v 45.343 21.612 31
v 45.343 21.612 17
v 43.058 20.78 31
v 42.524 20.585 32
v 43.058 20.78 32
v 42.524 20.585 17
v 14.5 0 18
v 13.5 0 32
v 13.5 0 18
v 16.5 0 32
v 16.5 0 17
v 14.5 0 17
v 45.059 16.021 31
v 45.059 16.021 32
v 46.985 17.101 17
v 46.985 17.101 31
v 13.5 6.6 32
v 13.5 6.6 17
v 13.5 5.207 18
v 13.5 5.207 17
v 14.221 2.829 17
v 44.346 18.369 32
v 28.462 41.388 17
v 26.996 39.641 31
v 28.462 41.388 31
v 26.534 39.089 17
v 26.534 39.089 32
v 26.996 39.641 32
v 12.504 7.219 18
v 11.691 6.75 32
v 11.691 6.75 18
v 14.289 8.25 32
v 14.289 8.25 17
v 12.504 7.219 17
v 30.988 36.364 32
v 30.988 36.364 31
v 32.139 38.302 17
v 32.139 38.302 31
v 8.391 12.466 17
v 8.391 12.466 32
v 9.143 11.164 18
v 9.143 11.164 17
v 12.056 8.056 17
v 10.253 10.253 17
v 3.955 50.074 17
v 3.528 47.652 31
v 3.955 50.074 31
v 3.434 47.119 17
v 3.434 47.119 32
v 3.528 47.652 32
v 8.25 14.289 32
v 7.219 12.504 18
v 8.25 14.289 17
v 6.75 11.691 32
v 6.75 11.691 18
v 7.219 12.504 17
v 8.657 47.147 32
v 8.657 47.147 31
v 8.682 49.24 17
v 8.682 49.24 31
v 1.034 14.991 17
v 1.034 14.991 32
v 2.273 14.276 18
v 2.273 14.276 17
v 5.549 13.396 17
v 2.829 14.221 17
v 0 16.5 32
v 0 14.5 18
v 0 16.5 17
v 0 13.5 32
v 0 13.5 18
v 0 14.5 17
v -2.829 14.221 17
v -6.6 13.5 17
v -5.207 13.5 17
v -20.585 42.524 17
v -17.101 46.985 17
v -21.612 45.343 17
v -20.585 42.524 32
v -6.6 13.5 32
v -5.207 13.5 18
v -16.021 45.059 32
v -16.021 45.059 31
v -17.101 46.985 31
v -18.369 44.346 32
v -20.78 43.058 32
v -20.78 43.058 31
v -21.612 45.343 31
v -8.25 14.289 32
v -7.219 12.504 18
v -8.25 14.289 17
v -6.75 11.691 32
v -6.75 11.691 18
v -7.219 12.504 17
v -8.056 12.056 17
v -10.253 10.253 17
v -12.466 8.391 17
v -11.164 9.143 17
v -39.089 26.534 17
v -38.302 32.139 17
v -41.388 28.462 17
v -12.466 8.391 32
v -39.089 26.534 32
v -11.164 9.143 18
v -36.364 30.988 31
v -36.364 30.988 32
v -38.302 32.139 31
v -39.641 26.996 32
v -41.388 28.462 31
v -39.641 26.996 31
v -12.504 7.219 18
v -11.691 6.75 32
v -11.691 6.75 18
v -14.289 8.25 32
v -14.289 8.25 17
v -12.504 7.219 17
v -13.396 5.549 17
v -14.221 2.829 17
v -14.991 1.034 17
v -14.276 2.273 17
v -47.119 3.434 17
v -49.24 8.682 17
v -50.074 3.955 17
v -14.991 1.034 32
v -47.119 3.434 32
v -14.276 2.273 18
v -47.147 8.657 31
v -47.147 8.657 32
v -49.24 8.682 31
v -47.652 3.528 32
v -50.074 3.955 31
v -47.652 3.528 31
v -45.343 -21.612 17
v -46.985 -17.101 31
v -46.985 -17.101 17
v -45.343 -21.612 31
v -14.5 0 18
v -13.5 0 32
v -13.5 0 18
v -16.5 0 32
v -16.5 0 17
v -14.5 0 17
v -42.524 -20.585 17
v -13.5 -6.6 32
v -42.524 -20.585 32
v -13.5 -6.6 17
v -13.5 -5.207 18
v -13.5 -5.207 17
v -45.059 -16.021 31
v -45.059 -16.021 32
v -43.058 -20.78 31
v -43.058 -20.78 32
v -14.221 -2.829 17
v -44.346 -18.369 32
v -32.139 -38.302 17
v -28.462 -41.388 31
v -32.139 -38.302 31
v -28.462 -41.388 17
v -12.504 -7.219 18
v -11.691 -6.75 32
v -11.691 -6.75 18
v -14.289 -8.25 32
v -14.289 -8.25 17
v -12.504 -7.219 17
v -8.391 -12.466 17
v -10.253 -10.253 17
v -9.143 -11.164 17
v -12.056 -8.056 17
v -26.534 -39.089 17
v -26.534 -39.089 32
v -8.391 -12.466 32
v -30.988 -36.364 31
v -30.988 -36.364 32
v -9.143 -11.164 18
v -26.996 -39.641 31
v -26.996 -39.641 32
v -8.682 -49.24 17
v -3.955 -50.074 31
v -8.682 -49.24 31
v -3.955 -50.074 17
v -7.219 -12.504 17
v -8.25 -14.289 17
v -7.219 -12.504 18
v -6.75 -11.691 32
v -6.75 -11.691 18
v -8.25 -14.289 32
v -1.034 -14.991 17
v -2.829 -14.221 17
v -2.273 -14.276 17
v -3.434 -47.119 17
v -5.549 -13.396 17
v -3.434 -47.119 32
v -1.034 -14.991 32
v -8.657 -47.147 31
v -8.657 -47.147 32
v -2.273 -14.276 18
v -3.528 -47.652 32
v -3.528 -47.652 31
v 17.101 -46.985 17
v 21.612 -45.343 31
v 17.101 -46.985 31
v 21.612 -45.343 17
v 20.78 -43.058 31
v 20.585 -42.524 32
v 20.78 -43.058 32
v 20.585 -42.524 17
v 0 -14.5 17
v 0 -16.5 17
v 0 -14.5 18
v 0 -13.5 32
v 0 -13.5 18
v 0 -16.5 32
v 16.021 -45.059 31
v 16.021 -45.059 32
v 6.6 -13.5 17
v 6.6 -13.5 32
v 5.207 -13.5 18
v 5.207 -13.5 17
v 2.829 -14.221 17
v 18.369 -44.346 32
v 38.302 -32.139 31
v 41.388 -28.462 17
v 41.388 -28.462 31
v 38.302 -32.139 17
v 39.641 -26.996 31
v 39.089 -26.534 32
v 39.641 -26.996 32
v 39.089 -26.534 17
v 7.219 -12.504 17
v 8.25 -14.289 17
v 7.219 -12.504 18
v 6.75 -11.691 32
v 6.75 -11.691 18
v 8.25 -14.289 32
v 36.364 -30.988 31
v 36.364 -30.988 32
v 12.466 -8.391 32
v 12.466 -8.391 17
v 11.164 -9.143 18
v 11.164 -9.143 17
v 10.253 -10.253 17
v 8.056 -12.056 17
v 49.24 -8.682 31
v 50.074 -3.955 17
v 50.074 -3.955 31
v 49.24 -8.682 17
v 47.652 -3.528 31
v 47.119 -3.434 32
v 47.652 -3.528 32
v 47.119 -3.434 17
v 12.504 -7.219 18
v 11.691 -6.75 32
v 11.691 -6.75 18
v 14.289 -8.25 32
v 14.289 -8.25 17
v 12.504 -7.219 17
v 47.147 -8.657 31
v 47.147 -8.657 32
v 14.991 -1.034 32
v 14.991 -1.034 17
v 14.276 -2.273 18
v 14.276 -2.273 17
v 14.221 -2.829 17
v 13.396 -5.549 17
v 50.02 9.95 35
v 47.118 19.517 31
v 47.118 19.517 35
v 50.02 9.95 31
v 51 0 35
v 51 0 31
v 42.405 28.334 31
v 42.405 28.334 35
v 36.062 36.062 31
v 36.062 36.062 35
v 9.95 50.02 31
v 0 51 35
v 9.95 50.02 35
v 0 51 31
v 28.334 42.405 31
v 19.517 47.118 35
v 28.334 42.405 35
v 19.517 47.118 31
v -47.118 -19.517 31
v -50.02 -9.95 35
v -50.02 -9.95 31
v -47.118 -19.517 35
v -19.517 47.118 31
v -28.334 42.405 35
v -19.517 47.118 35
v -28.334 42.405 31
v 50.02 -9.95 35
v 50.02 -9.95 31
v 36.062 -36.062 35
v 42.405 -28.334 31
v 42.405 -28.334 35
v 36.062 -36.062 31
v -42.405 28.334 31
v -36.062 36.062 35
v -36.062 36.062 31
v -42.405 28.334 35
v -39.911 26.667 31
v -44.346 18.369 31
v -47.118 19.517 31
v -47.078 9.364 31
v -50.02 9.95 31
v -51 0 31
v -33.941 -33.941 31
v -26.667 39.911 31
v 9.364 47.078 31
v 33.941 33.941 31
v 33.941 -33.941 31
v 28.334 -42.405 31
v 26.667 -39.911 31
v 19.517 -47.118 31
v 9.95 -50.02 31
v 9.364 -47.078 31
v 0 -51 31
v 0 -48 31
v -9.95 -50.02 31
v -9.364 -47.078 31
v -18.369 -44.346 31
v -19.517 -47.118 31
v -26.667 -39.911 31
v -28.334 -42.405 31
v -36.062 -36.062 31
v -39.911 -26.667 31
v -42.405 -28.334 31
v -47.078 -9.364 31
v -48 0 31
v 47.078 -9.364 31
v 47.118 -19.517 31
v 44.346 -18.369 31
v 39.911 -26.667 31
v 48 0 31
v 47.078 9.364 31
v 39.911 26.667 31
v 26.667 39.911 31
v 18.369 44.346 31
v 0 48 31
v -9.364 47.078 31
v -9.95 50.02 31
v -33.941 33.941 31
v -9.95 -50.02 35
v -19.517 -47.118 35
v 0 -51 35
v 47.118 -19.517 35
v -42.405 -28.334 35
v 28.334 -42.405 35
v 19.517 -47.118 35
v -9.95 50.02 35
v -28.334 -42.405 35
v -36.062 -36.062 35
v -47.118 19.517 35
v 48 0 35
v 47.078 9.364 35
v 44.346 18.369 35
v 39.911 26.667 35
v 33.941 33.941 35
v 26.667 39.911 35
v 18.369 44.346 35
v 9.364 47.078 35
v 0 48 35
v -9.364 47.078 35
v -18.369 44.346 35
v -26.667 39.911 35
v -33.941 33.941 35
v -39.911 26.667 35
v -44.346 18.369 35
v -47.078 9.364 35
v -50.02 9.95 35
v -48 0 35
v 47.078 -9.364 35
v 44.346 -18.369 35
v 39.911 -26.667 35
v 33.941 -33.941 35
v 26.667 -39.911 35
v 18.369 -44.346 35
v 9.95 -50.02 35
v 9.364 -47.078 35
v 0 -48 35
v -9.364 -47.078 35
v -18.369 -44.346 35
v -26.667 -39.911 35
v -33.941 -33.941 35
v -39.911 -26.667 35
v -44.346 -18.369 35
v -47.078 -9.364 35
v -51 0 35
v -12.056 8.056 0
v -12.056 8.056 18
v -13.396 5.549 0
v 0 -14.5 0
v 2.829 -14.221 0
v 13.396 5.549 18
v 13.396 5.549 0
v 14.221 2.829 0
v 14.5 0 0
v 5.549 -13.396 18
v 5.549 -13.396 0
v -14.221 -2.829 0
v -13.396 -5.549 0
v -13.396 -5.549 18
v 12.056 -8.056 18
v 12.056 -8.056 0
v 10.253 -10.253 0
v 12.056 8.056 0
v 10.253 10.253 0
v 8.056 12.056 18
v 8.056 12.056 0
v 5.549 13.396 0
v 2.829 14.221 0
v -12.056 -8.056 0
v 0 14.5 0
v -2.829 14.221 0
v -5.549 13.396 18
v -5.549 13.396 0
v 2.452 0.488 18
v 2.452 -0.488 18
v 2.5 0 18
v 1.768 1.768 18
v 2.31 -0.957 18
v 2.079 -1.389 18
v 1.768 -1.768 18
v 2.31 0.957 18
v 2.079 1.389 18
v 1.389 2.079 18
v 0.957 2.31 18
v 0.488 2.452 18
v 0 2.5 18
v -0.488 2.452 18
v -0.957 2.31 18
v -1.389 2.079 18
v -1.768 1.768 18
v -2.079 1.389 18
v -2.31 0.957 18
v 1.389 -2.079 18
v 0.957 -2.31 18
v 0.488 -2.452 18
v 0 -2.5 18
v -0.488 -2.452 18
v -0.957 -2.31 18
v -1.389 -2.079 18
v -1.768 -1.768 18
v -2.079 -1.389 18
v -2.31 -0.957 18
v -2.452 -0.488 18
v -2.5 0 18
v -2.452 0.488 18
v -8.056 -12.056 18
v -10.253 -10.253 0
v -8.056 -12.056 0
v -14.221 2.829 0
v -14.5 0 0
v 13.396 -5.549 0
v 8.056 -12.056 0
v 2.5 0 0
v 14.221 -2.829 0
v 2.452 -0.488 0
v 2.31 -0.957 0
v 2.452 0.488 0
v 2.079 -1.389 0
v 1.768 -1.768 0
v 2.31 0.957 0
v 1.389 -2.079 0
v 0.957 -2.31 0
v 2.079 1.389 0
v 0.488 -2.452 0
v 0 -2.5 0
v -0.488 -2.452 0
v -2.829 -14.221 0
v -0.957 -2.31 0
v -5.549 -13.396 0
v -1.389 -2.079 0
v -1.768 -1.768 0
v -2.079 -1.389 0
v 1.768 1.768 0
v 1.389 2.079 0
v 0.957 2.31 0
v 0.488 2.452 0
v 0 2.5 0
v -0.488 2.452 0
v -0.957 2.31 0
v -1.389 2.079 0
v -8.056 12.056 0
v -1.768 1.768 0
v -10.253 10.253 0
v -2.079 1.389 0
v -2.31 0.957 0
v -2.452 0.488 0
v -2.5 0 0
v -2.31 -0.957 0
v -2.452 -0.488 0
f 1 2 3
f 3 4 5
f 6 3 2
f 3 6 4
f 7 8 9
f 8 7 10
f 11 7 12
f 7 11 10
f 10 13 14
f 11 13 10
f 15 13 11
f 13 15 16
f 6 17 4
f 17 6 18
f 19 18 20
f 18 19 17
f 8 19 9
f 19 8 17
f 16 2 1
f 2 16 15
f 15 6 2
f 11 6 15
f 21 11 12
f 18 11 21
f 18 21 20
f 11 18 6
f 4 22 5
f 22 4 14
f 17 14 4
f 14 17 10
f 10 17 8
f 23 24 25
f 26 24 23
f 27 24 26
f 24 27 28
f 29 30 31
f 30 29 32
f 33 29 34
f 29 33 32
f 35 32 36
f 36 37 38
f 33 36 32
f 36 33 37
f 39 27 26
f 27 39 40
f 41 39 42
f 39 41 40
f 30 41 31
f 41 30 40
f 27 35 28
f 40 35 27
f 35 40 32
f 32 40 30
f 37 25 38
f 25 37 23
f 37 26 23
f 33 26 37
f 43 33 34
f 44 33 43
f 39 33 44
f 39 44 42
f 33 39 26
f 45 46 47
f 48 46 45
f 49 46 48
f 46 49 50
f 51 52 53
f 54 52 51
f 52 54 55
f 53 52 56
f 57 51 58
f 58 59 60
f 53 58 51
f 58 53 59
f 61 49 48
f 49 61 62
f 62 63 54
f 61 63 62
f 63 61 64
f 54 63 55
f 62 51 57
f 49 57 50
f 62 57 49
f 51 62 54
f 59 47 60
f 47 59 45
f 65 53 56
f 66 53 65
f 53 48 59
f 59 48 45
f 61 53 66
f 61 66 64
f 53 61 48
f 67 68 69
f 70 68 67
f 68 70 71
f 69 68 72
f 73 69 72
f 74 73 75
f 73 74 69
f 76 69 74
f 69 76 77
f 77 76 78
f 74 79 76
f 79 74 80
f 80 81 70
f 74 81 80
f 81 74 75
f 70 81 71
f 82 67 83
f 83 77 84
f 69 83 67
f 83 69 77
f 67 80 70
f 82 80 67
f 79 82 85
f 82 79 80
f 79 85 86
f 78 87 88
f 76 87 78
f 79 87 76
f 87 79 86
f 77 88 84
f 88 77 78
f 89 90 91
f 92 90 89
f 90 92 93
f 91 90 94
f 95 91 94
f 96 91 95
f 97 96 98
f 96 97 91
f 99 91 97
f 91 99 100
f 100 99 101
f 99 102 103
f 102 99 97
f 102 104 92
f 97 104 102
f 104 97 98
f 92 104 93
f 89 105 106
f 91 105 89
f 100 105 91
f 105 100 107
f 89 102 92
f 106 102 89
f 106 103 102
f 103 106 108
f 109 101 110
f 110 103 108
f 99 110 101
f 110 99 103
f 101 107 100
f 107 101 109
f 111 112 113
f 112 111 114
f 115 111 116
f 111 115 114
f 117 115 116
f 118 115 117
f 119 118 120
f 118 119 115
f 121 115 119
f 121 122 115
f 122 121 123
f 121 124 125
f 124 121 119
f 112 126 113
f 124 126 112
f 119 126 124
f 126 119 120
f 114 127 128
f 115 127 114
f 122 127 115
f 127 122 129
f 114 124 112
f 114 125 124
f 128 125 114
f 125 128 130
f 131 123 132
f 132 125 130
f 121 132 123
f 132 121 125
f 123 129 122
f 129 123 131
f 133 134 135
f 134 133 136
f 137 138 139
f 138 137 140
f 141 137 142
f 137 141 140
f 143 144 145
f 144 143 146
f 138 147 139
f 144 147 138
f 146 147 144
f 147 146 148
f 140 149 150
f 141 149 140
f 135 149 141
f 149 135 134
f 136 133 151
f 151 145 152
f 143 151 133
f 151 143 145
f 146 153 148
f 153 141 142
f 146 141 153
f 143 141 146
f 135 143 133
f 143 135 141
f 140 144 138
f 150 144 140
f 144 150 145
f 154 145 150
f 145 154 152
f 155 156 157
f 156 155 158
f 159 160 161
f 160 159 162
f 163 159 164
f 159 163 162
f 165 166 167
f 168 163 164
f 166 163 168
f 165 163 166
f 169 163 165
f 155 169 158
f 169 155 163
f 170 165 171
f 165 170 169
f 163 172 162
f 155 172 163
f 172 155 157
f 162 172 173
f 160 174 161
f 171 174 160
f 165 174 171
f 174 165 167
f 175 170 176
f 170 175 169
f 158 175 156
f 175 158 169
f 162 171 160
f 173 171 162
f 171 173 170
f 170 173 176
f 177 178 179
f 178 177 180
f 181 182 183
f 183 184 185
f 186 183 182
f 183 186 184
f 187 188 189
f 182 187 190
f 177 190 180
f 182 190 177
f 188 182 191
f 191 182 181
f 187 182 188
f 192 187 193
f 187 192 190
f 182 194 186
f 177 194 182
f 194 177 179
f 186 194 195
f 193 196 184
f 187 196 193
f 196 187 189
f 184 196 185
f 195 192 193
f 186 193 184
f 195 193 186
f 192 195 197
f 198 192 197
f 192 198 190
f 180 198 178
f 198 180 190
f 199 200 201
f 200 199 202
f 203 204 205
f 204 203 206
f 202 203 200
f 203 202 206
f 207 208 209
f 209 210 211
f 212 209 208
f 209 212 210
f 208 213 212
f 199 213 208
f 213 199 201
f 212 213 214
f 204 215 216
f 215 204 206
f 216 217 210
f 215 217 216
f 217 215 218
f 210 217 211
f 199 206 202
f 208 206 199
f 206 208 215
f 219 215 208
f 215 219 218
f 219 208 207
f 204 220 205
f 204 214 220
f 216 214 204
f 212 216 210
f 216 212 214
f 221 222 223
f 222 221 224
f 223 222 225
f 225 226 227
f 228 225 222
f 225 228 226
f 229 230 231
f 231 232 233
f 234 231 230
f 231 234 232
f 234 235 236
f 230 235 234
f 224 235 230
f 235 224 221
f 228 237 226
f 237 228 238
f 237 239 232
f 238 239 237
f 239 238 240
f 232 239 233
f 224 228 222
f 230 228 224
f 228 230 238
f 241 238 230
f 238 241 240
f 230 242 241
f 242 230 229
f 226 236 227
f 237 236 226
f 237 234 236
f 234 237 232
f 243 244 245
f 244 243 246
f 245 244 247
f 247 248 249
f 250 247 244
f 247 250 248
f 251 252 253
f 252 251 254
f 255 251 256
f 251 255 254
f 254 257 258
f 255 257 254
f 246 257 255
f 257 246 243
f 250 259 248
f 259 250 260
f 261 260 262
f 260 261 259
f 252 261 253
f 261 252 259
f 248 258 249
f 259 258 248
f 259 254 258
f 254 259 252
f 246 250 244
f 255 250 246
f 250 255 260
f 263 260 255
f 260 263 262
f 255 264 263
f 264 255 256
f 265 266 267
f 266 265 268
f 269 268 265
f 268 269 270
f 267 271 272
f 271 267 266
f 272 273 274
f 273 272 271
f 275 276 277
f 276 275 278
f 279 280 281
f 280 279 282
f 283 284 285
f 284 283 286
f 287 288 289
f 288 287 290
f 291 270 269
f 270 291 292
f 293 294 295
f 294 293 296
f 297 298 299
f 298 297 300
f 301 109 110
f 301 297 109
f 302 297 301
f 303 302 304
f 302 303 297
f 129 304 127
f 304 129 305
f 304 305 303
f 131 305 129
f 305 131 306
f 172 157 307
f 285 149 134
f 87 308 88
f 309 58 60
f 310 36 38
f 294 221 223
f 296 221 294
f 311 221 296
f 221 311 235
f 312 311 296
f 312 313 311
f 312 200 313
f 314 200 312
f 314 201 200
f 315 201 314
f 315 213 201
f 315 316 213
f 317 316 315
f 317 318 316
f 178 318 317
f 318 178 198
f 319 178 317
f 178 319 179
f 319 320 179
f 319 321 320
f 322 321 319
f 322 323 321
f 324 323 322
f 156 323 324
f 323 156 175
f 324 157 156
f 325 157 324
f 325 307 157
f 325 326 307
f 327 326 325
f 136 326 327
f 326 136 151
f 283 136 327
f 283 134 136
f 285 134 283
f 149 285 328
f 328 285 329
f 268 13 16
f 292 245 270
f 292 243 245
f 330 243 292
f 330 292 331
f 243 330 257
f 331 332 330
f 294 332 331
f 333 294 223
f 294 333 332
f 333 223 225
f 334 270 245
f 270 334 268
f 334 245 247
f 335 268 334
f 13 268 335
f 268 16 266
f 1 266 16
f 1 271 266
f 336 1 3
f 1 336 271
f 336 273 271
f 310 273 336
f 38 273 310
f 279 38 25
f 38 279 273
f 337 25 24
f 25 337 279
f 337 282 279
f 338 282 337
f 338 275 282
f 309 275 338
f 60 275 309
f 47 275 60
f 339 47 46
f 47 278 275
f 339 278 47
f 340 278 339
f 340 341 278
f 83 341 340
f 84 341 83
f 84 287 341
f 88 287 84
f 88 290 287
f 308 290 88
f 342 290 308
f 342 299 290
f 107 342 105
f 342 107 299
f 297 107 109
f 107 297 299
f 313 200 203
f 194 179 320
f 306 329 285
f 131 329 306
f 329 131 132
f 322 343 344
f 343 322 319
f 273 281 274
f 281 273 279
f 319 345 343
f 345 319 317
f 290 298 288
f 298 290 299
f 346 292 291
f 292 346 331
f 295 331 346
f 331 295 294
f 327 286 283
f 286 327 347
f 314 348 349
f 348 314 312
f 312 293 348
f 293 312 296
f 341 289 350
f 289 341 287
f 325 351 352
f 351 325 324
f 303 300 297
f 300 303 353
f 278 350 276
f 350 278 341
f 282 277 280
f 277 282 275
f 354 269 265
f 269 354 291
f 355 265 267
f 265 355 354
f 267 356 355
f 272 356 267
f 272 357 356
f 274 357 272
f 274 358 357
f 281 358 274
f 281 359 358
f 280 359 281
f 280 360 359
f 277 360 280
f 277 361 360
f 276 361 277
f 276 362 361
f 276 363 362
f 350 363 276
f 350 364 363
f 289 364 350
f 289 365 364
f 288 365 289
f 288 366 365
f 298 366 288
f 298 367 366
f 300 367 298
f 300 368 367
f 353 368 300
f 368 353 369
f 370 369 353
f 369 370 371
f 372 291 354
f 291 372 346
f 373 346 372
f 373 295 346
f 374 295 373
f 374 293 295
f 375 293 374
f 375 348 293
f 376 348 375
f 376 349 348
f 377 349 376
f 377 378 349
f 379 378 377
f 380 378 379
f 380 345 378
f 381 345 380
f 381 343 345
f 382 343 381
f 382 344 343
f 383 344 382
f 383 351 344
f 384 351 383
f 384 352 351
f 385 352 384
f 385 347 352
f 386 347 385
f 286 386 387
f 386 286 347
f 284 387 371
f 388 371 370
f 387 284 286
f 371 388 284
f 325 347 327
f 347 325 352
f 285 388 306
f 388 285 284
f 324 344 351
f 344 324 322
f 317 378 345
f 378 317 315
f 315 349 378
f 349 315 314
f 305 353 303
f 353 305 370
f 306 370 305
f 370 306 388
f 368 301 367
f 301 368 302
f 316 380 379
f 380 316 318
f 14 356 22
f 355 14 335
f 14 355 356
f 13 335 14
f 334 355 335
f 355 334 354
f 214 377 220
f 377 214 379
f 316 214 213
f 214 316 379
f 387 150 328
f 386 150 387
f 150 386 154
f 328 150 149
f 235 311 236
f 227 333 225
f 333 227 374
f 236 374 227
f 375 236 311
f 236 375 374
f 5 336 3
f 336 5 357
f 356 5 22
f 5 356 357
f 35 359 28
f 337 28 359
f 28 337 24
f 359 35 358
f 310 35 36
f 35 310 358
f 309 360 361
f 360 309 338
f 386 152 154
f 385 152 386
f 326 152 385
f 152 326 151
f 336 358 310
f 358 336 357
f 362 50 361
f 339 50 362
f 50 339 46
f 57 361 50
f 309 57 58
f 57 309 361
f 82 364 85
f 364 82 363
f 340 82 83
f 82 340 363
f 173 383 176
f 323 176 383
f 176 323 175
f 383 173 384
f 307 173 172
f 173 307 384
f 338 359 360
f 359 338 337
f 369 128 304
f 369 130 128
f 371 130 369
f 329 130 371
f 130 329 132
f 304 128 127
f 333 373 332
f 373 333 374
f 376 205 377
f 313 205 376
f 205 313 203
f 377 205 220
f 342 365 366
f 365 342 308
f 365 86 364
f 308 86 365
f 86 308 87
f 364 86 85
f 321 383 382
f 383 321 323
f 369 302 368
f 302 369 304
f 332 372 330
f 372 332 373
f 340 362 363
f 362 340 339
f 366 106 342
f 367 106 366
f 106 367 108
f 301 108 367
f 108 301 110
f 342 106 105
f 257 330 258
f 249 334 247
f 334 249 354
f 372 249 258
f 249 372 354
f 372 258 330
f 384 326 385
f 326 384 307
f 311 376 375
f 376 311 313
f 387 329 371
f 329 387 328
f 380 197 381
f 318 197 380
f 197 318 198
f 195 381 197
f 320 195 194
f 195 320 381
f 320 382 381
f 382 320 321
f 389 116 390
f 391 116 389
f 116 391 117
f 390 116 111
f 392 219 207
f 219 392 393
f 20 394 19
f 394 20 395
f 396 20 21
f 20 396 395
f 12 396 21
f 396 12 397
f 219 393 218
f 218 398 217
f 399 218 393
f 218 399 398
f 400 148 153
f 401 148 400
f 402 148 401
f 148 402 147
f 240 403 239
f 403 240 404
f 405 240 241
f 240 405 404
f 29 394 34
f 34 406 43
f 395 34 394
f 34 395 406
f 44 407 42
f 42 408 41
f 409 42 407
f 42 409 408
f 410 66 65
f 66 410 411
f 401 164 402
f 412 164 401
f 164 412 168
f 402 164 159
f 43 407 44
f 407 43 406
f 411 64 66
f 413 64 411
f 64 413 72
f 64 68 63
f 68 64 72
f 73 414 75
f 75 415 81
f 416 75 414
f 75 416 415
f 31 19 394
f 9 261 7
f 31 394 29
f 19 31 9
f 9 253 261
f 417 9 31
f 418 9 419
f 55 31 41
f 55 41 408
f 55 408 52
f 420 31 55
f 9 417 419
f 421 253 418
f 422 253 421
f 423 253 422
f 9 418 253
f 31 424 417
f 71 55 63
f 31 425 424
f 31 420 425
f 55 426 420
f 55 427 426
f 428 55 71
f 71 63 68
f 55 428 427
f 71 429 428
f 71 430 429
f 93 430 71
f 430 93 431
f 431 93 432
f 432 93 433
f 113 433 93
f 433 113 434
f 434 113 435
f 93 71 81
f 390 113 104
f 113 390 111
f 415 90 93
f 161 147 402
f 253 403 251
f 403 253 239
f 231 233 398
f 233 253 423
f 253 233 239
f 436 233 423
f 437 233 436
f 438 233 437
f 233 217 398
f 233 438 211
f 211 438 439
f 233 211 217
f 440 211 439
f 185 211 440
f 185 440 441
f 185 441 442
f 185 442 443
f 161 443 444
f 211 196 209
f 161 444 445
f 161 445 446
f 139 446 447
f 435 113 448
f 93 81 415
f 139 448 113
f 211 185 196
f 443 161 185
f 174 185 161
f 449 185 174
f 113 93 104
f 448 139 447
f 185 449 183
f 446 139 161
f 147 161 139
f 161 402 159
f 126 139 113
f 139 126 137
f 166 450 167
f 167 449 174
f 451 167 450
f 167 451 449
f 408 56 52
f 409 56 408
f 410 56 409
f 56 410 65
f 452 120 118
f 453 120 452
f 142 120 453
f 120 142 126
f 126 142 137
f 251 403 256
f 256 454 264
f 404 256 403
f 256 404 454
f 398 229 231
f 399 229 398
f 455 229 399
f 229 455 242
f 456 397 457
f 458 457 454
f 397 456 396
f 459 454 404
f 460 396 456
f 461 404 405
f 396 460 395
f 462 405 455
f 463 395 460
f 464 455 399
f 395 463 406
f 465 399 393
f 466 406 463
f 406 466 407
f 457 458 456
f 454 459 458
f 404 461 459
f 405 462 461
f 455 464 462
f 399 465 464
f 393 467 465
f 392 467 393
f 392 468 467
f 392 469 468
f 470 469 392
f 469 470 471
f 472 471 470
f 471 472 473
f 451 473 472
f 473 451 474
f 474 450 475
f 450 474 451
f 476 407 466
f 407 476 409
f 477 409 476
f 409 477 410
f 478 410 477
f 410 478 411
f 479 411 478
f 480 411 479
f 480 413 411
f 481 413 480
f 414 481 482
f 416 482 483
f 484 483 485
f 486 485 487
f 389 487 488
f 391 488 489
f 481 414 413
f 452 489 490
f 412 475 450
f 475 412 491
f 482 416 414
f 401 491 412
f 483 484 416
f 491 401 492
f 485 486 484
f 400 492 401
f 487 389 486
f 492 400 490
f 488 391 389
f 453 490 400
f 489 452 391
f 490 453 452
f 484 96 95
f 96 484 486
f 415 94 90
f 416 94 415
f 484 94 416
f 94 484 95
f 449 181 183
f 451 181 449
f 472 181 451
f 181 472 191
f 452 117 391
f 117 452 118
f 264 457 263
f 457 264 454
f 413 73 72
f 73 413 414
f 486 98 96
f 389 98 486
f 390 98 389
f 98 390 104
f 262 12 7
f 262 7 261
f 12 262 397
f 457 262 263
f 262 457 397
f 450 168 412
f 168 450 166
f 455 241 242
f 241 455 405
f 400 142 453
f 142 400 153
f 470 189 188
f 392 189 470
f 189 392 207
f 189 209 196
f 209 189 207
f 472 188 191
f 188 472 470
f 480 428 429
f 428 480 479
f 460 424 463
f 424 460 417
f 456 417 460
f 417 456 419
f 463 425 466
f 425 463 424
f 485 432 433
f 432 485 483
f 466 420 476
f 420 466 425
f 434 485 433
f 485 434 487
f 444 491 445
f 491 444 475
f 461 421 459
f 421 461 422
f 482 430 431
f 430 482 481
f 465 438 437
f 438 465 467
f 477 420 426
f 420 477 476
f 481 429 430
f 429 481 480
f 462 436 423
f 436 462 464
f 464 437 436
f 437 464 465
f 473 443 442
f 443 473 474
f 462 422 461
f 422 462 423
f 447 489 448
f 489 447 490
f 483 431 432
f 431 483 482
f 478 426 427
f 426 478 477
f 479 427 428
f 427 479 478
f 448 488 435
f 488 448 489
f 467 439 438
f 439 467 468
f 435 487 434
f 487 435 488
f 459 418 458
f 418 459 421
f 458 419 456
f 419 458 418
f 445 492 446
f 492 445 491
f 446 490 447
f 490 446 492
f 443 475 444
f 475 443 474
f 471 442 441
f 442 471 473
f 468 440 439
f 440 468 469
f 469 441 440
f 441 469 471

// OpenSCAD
$fn = 32;

// ----------------------------------------------------------------------
// Impeller: 100 mm, 12 blades, 35 mm tall
// ----------------------------------------------------------------------

// --- parameters (mm) ---
center_d = 29;            // hub diameter
center_h = 18;            // hub height
wheel_d = 100;            // outer diameter over the blades
blade_count = 12;         // number of blades
blade_t = 3;              // blade thickness
blade_h = 14;             // blade height
blade_in_r = 13.5;        // blade root radius
blade_out_r = 47;         // blade tip radius
sweep = 20;               // blade sweep, degrees
bore_d = 5;               // shaft bore
shroud_h = 3;             // shroud ring thickness
shroud_d = 102;           // shroud outside diameter

module hub() {
  cylinder(h = center_h, d = center_d);
}

module blade() {
  /* blade swept between two boxes: hull of the root and the tip section */
  hull() {
    translate([blade_in_r, 0, center_h - 1])
      cube([blade_t, blade_t * 2.2, blade_h + 1], center = false);
    rotate([0, 0, sweep])
      translate([blade_out_r, 0, center_h - 1])
        cube([blade_t, blade_t * 1.6, blade_h + 1], center = false);
  }
}

module blades() {
  for (i = [0 : blade_count - 1])
    rotate([0, 0, i * 360 / blade_count]) blade();
}

module shroud() {
  translate([0, 0, center_h + blade_h - 1])
    difference() {
      cylinder(h = shroud_h + 1, d = shroud_d);
      translate([0, 0, -1]) cylinder(h = shroud_h + 3, d = shroud_d - 2 * 3);
    }
}

difference() {
  union() {
    hub();
    blades();
    shroud();
  }
  translate([0, 0, -1]) cylinder(h = center_h + blade_h + shroud_h + 3, d = bore_d);
}
